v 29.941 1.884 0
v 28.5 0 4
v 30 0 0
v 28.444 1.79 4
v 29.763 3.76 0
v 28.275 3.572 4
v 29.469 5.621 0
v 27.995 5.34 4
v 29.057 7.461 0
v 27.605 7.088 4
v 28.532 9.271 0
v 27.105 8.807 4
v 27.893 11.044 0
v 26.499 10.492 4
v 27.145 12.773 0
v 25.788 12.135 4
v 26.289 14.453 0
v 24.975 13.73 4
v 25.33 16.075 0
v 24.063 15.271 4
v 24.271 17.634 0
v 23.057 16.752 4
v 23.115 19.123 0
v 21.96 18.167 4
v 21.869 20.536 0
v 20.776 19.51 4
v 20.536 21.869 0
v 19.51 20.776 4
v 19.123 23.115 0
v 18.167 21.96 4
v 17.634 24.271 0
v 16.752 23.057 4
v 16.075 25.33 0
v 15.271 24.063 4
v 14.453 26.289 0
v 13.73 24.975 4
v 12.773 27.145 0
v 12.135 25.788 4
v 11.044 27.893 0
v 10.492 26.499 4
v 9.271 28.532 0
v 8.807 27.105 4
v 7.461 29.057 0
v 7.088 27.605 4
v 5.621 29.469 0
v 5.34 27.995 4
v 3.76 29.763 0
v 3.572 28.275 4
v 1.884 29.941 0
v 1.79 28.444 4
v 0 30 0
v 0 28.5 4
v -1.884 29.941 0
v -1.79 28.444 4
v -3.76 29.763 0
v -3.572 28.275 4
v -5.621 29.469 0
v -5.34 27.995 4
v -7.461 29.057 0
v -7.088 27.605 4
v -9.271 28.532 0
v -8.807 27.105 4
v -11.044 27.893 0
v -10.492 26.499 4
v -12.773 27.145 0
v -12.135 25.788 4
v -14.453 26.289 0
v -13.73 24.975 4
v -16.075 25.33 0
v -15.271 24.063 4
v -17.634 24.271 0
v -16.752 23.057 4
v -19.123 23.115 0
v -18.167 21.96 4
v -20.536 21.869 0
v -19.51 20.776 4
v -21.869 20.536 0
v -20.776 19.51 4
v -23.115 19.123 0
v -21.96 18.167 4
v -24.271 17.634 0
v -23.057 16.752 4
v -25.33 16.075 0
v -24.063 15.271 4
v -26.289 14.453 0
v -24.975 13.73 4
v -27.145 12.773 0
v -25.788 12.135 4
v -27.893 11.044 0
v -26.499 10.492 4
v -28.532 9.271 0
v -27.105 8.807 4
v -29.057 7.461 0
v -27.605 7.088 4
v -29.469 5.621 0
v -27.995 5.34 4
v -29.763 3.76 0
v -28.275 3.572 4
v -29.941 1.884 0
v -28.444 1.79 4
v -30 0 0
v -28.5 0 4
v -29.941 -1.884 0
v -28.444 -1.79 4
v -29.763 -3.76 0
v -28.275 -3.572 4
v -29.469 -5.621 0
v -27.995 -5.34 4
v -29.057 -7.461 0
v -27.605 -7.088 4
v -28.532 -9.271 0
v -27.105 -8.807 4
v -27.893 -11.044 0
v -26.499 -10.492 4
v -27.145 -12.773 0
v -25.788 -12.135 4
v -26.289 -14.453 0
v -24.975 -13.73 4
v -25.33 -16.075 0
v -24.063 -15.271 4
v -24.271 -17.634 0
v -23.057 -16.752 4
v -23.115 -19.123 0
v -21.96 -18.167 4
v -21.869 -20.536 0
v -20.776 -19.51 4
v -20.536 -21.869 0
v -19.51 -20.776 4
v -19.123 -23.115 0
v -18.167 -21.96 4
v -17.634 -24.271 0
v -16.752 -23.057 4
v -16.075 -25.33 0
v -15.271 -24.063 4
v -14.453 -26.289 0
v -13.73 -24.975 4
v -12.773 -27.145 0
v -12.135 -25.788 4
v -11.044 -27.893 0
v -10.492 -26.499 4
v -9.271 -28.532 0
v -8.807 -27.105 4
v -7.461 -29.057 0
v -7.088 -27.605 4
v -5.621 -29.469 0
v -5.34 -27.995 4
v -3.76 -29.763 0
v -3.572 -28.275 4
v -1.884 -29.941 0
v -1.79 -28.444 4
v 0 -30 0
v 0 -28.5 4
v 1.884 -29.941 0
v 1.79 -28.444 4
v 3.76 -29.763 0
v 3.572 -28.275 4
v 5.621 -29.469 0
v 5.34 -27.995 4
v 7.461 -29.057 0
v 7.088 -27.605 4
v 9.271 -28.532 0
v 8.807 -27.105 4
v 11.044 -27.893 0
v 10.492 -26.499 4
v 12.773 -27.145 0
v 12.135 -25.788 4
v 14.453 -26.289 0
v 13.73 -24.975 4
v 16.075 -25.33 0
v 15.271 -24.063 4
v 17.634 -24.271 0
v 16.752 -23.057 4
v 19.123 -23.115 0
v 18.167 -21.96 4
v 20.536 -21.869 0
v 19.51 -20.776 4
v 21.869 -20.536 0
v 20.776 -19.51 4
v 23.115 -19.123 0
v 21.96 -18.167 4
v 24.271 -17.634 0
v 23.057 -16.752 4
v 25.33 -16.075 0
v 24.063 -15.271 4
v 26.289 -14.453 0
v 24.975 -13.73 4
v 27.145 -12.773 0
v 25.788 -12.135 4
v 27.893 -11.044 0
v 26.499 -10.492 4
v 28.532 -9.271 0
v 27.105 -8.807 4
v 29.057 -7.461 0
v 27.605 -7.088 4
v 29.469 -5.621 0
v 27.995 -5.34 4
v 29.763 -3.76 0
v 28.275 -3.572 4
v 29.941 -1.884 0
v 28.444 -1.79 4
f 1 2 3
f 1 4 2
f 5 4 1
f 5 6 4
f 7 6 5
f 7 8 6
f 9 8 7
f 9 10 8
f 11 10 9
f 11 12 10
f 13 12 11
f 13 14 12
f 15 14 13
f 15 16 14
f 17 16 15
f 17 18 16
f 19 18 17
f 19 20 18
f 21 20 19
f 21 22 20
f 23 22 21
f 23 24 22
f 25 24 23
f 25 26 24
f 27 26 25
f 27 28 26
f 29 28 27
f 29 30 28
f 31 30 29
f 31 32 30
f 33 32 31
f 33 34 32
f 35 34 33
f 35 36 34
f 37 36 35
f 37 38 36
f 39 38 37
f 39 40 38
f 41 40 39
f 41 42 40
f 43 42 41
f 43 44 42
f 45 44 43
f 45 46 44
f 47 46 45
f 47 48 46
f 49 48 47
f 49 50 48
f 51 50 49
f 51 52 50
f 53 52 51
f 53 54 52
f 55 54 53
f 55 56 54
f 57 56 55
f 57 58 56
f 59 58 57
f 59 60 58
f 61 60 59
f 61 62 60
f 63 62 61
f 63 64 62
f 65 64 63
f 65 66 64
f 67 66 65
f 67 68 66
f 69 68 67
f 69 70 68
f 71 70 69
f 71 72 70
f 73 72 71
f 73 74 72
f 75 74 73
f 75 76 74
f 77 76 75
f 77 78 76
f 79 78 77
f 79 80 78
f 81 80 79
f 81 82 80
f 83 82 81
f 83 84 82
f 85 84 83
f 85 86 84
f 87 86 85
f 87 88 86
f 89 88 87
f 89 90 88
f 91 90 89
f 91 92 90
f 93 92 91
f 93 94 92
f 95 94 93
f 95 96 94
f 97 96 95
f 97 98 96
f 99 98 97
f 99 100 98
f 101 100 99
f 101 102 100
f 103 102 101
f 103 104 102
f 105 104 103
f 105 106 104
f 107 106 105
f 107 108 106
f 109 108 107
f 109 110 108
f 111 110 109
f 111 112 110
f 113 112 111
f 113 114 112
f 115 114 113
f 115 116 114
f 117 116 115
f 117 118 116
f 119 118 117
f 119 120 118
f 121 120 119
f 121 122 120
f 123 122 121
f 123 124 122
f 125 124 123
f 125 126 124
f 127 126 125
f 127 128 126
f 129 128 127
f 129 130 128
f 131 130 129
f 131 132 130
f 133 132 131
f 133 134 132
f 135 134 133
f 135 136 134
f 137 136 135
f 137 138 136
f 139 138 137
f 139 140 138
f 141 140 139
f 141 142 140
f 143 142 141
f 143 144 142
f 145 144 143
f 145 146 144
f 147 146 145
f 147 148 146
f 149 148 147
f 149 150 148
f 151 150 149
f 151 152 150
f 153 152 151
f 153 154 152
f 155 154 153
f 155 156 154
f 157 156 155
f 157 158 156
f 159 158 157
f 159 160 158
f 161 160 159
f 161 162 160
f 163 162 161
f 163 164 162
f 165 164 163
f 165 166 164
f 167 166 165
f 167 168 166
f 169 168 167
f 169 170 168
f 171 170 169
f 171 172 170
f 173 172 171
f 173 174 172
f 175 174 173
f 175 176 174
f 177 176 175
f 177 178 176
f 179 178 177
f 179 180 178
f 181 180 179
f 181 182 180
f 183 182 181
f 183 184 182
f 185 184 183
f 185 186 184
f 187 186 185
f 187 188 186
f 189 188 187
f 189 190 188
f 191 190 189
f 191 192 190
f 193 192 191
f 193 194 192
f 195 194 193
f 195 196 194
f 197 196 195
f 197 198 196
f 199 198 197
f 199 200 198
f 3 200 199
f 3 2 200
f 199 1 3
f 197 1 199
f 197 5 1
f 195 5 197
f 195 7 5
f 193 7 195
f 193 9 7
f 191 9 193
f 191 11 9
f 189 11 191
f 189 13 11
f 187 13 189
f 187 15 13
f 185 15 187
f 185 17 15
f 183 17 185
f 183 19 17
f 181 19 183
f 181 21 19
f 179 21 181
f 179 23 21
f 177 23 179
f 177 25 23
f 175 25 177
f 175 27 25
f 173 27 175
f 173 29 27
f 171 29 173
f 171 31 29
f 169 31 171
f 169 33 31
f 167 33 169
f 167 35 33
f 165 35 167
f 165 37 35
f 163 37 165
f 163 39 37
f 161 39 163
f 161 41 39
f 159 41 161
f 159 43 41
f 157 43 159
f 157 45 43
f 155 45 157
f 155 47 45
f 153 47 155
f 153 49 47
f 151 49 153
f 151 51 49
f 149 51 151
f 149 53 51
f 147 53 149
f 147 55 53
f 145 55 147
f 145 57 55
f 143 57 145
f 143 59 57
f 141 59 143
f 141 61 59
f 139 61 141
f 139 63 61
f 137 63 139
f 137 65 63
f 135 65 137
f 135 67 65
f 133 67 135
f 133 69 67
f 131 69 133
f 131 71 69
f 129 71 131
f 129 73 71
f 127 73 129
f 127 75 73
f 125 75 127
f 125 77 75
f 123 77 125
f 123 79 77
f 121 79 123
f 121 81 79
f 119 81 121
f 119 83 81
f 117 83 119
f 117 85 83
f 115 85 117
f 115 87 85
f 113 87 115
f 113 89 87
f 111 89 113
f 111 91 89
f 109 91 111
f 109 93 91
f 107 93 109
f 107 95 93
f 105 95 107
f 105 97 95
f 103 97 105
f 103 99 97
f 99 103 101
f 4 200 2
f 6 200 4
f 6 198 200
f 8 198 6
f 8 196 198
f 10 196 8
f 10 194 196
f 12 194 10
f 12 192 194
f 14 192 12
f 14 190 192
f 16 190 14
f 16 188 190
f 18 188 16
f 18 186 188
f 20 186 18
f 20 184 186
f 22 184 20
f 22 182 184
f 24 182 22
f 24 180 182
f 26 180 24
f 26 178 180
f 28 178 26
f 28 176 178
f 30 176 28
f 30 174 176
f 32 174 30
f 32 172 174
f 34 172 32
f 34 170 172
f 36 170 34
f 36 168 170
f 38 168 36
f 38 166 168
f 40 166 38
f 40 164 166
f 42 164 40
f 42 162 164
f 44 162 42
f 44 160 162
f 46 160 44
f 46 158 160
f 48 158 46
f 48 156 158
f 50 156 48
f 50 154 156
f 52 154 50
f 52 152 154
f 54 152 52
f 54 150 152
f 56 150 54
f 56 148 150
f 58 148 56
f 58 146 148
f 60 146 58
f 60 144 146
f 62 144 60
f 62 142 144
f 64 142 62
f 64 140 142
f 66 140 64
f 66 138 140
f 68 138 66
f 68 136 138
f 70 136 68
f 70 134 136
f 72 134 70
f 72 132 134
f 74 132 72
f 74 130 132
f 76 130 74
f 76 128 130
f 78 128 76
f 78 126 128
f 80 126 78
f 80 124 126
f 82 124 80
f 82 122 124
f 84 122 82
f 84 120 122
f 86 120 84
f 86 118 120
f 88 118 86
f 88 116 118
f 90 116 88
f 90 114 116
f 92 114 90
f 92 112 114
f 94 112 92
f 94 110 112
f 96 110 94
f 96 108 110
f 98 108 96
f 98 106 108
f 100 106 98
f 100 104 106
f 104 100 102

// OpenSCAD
// file: build.scad
$build_id = "";

function building(filename) = is_undef(filename) ?
  !is_undef(build)
  : !is_undef(build) && build == filename;

function previewing() = !building();

module build(filename) {
  $build_id = filename;

  if(!is_undef(scad_build_scan) && scad_build_scan == true) {
    echo(str("scad_build_scan: ", filename));
  }
  else if(previewing() || build == filename) {
    children();
  }
}

module preview_row(spacing) {
  if(previewing()) {
    for(x = [0:1:$children - 1]) {
      translate([x * spacing, 0, 0]) {
        children(x);
      }
    }
  }
  else {
    children();
  }
}

module preview_column(spacing) {
  if(previewing()) {
    for(y = [0:1:$children - 1]) {
      translate([0, y * spacing, 0]) {
        children(y);
      }
    }
  }
  else {
    children();
  }
}
// file: minibase.scad
// Based off of titancraft's Customizable Miniature Base (CC0 1.0)
// https://www.thingiverse.com/thing:1112237

include <./build.scad>

$base_rim = 1; //	[1: tapered, 2: inclined, 3: flat]
// Number of sides:
$base_shape = 100; //	[30:Low-res Circle, 100: Hi-res Circle, 5:Pentagon, 6:Hexagon, 8:Octagon, 4:Square, 3:Triangle]

$base_diameter = 32;
$base_height = 4;
$base_slant = 95; // [50:100]

// Percentage:
$base_stretch = 100;

//('Cool' base only)
$base_inner_circle_ratio = 40; // [10:80]

module tapered(r=40) {
  $base_rim = 1;
  $base_inner_circle_ratio = r;

  children();
}

module inclined() {
  $base_rim = 2;

  children();
}

module flat() {
  $base_rim = 3;

  children();
}

module shape(s) {
  $base_shape = s;

  children();
}

module diameter(d) {
  $base_diameter = d;

  children();
}

module height(h) {
  $base_height = h;

  children();
}

module slant(s) {
  $base_slant = s;

  children();
}

module stretch(s) {
  $base_stretch = s;

  children();
}

module base(id) {
  build(id) union() {
    radius = $base_diameter/2;
    scale([$base_stretch/100, 1, 1]){
      if ($base_rim == 1){
        // tapered base
        cyl1_height = $base_height * (1-$base_inner_circle_ratio/100);
        cylinder(cyl1_height, radius, radius * $base_slant/100, $fn=$base_shape);

        cyl2_radius = radius  * $base_slant/100 * .95;
        cyl2_height = $base_height - cyl1_height;

        translate([0, 0, cyl1_height]){
          cylinder(cyl2_height, cyl2_radius, cyl2_radius * $base_slant/100, $fn=$base_shape);
          cylinder(cyl2_height*.5, radius * $base_slant/100, cyl2_radius, $fn=$base_shape);
        }
      } else if ($base_rim == 2){
        // inclined base
        cylinder($base_height, radius, radius * $base_slant/100, $fn=$base_shape);
      } else if ($base_rim == 3){
        // flat base

        cylinder($base_height, radius, radius, $fn=$base_shape);
      }
    }
  }
}
// main file
include <./minibase.scad>

inclined() diameter(60) base("60mm-opr-monsters-walkers");
